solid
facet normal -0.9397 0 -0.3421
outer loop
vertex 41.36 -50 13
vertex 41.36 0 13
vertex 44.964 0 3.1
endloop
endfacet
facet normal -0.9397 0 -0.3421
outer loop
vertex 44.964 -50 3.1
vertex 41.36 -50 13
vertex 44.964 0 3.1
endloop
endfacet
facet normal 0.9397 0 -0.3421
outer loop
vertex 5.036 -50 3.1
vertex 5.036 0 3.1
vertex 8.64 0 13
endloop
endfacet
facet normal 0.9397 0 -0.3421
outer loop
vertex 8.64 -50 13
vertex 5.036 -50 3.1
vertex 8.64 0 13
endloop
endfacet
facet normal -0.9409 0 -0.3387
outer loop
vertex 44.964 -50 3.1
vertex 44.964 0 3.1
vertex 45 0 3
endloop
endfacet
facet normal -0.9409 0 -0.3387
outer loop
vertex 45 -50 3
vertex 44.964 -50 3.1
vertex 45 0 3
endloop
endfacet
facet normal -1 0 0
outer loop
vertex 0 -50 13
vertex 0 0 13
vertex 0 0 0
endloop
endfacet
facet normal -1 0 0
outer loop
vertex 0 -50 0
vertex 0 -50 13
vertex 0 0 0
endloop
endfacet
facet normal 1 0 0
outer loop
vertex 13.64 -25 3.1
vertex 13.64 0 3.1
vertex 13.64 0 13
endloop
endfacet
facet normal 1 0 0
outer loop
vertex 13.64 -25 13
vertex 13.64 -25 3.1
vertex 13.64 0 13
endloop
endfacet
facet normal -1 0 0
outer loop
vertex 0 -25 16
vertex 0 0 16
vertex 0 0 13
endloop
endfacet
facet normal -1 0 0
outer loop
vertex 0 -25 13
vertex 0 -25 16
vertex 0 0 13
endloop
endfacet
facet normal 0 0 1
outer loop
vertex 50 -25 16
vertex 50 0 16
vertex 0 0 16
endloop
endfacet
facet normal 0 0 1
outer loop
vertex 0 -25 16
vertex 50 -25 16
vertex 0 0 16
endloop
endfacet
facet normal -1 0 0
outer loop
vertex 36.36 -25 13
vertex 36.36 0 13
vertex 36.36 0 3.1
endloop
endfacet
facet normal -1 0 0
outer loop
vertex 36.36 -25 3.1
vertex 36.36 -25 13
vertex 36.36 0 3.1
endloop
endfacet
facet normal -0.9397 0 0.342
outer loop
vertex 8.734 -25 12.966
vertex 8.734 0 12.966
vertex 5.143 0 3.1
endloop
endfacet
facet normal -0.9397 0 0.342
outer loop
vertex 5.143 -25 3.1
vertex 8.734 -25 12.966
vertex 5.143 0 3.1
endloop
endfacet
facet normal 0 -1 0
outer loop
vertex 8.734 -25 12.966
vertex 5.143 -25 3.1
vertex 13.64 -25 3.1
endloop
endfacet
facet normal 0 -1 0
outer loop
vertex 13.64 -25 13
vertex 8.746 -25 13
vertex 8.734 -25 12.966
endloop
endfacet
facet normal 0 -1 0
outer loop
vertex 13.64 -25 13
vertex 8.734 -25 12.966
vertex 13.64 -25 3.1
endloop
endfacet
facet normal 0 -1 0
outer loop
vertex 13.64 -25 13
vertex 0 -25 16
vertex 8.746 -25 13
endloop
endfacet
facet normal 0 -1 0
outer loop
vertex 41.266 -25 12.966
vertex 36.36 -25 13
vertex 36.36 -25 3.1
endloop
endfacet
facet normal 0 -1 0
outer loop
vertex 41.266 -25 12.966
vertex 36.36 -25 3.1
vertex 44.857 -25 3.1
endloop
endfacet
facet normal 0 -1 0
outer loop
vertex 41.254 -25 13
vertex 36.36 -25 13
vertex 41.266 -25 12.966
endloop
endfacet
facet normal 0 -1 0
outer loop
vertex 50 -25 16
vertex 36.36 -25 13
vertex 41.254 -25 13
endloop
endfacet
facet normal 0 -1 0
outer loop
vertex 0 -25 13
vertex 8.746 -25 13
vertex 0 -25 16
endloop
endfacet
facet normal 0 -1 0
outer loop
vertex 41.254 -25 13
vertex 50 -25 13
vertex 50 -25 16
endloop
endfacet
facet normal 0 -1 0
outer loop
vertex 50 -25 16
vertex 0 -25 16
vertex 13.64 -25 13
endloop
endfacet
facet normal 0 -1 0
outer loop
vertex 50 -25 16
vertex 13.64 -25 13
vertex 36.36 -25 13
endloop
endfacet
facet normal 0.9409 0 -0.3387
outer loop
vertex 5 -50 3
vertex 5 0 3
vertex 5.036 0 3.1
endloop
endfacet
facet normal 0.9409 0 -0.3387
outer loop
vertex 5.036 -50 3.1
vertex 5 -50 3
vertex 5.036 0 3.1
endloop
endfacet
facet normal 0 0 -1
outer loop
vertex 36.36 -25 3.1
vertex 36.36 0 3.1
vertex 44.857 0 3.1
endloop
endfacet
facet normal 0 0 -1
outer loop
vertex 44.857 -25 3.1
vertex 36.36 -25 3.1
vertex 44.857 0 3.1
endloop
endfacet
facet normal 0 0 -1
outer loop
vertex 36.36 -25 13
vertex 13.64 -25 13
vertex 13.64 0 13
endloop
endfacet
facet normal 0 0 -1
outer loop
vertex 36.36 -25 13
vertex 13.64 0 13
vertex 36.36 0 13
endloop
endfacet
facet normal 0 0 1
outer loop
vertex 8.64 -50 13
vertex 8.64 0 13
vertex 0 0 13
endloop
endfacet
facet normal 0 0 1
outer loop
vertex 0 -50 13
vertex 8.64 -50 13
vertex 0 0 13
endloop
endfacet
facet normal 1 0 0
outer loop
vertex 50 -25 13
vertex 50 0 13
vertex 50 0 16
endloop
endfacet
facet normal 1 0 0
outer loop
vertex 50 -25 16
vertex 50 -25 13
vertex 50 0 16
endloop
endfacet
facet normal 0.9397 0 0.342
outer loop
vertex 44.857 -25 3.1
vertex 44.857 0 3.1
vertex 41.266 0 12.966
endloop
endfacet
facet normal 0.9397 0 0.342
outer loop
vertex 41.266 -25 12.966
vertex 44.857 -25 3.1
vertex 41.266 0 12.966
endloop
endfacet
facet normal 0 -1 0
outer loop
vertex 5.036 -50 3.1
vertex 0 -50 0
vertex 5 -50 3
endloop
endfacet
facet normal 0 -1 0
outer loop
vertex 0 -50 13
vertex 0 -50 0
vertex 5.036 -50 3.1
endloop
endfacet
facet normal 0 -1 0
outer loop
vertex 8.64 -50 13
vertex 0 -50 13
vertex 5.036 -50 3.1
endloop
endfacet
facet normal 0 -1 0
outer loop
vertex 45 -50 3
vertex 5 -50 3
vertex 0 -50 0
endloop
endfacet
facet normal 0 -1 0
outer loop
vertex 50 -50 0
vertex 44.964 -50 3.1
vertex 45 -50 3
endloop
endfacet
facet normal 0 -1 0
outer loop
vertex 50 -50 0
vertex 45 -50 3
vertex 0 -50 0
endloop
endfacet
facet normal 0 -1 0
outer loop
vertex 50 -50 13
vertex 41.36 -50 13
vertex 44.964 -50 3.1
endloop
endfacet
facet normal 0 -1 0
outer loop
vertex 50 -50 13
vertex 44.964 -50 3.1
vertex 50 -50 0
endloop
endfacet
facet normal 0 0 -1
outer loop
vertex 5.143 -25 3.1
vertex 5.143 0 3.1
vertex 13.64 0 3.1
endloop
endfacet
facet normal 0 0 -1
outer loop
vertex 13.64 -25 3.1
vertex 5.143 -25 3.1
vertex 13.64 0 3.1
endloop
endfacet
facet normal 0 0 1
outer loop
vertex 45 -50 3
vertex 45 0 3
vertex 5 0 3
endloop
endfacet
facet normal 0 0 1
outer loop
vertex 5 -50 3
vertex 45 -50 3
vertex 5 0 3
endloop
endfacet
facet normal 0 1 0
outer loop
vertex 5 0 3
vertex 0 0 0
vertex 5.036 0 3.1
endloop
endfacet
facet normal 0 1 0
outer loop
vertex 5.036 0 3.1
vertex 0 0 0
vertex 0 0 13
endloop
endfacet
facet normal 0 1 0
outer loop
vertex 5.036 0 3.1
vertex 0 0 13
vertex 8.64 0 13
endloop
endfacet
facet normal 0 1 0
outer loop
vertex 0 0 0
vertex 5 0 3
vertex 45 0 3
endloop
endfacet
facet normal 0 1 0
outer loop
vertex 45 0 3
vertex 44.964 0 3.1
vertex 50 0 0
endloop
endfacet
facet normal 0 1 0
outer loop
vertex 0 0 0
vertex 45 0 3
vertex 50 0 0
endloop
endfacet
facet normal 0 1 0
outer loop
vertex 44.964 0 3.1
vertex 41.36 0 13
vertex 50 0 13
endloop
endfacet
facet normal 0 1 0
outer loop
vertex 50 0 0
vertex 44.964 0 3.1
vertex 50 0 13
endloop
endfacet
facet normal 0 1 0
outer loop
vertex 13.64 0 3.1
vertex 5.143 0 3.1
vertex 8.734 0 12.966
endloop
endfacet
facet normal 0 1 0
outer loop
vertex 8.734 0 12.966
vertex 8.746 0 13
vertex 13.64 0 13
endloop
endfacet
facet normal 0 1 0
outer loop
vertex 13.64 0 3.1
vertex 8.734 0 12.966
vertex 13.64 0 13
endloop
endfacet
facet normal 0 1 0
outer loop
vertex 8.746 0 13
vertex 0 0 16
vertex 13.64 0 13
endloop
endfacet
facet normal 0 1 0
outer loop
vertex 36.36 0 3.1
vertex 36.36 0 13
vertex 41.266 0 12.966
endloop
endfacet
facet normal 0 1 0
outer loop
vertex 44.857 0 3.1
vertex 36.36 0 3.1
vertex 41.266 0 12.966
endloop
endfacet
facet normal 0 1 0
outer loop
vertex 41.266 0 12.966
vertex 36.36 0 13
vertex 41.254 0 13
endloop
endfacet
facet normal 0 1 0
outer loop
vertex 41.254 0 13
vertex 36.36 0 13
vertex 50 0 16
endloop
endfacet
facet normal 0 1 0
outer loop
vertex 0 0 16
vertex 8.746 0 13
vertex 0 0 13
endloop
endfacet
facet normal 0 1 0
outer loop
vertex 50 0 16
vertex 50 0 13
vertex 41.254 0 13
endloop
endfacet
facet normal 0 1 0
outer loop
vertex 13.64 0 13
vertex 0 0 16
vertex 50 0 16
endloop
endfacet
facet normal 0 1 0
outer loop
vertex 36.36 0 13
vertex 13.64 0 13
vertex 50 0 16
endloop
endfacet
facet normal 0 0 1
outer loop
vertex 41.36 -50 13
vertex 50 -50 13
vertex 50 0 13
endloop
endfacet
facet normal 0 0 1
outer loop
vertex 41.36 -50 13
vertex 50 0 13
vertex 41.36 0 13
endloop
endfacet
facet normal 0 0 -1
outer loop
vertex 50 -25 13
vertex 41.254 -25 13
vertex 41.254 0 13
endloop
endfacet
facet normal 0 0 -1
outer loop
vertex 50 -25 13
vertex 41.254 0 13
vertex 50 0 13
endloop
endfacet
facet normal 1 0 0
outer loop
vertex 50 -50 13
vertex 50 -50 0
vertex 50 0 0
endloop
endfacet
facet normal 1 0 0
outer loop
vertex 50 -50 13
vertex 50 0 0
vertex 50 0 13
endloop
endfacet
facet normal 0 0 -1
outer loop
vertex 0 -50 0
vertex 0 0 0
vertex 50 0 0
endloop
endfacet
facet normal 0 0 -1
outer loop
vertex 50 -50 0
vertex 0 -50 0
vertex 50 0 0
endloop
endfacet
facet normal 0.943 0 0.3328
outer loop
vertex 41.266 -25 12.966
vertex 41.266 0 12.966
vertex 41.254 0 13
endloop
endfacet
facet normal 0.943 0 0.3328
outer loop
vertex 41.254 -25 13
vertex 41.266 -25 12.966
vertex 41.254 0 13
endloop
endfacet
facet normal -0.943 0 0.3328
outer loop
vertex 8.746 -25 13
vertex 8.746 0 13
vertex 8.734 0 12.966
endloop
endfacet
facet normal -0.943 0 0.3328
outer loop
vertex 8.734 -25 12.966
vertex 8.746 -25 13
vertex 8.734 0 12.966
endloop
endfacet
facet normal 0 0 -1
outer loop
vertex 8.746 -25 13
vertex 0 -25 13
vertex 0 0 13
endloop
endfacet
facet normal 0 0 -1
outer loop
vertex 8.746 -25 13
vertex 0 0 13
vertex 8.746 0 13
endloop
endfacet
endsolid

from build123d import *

# Parameters (mm, degrees)
F1_DEPTH = 50
F2_DEPTH = 25


with BuildPart() as f1:
    # F0 (on Front) → F1 (new body)
    with BuildSketch(Plane.XZ):
        Polygon((0, 3.1), (0, 3), (5, 3), (5.0363970234, 3.1), align=None)
        Polygon((0, 13), (0, 3.1), (5.0363970234, 3.1), (8.6397023427, 13), align=None)
        Polygon((0, 3), (0, 0), (50, 0), (50, 3), (45, 3), (44.8935822228, 3), (36.3602976573, 3), (13.6397023427, 3), (5.1064177772, 3), (5, 3), align=None)
        Polygon((44.9636029766, 3.1), (50, 3.1), (50, 13), (41.3602976573, 13), align=None)
        Polygon((45, 3), (50, 3), (50, 3.1), (44.9636029766, 3.1), align=None)
    extrude(amount=F1_DEPTH)


with BuildPart() as f2:
    # F0 (on Front) → F2 (new body)
    with BuildSketch(Plane.XZ):
        Polygon((0, 16), (0, 13), (8.6397023427, 13), (8.7461201199, 13), (13.6397023427, 13), (36.3602976573, 13), (41.2538798801, 13), (41.3602976573, 13), (50, 13), (50, 16), align=None)
        Polygon((8.7336716047, 12.9657979857), (5.1428148007, 3.1), (13.6397023427, 3.1), (13.6397023427, 13), (8.7461201199, 13), align=None)
        Polygon((36.3602976573, 3.1), (44.8571851993, 3.1), (41.2663283953, 12.9657979857), (41.2538798801, 13), (36.3602976573, 13), align=None)
    extrude(amount=F2_DEPTH)


solid = Compound([f1.part, f2.part])
